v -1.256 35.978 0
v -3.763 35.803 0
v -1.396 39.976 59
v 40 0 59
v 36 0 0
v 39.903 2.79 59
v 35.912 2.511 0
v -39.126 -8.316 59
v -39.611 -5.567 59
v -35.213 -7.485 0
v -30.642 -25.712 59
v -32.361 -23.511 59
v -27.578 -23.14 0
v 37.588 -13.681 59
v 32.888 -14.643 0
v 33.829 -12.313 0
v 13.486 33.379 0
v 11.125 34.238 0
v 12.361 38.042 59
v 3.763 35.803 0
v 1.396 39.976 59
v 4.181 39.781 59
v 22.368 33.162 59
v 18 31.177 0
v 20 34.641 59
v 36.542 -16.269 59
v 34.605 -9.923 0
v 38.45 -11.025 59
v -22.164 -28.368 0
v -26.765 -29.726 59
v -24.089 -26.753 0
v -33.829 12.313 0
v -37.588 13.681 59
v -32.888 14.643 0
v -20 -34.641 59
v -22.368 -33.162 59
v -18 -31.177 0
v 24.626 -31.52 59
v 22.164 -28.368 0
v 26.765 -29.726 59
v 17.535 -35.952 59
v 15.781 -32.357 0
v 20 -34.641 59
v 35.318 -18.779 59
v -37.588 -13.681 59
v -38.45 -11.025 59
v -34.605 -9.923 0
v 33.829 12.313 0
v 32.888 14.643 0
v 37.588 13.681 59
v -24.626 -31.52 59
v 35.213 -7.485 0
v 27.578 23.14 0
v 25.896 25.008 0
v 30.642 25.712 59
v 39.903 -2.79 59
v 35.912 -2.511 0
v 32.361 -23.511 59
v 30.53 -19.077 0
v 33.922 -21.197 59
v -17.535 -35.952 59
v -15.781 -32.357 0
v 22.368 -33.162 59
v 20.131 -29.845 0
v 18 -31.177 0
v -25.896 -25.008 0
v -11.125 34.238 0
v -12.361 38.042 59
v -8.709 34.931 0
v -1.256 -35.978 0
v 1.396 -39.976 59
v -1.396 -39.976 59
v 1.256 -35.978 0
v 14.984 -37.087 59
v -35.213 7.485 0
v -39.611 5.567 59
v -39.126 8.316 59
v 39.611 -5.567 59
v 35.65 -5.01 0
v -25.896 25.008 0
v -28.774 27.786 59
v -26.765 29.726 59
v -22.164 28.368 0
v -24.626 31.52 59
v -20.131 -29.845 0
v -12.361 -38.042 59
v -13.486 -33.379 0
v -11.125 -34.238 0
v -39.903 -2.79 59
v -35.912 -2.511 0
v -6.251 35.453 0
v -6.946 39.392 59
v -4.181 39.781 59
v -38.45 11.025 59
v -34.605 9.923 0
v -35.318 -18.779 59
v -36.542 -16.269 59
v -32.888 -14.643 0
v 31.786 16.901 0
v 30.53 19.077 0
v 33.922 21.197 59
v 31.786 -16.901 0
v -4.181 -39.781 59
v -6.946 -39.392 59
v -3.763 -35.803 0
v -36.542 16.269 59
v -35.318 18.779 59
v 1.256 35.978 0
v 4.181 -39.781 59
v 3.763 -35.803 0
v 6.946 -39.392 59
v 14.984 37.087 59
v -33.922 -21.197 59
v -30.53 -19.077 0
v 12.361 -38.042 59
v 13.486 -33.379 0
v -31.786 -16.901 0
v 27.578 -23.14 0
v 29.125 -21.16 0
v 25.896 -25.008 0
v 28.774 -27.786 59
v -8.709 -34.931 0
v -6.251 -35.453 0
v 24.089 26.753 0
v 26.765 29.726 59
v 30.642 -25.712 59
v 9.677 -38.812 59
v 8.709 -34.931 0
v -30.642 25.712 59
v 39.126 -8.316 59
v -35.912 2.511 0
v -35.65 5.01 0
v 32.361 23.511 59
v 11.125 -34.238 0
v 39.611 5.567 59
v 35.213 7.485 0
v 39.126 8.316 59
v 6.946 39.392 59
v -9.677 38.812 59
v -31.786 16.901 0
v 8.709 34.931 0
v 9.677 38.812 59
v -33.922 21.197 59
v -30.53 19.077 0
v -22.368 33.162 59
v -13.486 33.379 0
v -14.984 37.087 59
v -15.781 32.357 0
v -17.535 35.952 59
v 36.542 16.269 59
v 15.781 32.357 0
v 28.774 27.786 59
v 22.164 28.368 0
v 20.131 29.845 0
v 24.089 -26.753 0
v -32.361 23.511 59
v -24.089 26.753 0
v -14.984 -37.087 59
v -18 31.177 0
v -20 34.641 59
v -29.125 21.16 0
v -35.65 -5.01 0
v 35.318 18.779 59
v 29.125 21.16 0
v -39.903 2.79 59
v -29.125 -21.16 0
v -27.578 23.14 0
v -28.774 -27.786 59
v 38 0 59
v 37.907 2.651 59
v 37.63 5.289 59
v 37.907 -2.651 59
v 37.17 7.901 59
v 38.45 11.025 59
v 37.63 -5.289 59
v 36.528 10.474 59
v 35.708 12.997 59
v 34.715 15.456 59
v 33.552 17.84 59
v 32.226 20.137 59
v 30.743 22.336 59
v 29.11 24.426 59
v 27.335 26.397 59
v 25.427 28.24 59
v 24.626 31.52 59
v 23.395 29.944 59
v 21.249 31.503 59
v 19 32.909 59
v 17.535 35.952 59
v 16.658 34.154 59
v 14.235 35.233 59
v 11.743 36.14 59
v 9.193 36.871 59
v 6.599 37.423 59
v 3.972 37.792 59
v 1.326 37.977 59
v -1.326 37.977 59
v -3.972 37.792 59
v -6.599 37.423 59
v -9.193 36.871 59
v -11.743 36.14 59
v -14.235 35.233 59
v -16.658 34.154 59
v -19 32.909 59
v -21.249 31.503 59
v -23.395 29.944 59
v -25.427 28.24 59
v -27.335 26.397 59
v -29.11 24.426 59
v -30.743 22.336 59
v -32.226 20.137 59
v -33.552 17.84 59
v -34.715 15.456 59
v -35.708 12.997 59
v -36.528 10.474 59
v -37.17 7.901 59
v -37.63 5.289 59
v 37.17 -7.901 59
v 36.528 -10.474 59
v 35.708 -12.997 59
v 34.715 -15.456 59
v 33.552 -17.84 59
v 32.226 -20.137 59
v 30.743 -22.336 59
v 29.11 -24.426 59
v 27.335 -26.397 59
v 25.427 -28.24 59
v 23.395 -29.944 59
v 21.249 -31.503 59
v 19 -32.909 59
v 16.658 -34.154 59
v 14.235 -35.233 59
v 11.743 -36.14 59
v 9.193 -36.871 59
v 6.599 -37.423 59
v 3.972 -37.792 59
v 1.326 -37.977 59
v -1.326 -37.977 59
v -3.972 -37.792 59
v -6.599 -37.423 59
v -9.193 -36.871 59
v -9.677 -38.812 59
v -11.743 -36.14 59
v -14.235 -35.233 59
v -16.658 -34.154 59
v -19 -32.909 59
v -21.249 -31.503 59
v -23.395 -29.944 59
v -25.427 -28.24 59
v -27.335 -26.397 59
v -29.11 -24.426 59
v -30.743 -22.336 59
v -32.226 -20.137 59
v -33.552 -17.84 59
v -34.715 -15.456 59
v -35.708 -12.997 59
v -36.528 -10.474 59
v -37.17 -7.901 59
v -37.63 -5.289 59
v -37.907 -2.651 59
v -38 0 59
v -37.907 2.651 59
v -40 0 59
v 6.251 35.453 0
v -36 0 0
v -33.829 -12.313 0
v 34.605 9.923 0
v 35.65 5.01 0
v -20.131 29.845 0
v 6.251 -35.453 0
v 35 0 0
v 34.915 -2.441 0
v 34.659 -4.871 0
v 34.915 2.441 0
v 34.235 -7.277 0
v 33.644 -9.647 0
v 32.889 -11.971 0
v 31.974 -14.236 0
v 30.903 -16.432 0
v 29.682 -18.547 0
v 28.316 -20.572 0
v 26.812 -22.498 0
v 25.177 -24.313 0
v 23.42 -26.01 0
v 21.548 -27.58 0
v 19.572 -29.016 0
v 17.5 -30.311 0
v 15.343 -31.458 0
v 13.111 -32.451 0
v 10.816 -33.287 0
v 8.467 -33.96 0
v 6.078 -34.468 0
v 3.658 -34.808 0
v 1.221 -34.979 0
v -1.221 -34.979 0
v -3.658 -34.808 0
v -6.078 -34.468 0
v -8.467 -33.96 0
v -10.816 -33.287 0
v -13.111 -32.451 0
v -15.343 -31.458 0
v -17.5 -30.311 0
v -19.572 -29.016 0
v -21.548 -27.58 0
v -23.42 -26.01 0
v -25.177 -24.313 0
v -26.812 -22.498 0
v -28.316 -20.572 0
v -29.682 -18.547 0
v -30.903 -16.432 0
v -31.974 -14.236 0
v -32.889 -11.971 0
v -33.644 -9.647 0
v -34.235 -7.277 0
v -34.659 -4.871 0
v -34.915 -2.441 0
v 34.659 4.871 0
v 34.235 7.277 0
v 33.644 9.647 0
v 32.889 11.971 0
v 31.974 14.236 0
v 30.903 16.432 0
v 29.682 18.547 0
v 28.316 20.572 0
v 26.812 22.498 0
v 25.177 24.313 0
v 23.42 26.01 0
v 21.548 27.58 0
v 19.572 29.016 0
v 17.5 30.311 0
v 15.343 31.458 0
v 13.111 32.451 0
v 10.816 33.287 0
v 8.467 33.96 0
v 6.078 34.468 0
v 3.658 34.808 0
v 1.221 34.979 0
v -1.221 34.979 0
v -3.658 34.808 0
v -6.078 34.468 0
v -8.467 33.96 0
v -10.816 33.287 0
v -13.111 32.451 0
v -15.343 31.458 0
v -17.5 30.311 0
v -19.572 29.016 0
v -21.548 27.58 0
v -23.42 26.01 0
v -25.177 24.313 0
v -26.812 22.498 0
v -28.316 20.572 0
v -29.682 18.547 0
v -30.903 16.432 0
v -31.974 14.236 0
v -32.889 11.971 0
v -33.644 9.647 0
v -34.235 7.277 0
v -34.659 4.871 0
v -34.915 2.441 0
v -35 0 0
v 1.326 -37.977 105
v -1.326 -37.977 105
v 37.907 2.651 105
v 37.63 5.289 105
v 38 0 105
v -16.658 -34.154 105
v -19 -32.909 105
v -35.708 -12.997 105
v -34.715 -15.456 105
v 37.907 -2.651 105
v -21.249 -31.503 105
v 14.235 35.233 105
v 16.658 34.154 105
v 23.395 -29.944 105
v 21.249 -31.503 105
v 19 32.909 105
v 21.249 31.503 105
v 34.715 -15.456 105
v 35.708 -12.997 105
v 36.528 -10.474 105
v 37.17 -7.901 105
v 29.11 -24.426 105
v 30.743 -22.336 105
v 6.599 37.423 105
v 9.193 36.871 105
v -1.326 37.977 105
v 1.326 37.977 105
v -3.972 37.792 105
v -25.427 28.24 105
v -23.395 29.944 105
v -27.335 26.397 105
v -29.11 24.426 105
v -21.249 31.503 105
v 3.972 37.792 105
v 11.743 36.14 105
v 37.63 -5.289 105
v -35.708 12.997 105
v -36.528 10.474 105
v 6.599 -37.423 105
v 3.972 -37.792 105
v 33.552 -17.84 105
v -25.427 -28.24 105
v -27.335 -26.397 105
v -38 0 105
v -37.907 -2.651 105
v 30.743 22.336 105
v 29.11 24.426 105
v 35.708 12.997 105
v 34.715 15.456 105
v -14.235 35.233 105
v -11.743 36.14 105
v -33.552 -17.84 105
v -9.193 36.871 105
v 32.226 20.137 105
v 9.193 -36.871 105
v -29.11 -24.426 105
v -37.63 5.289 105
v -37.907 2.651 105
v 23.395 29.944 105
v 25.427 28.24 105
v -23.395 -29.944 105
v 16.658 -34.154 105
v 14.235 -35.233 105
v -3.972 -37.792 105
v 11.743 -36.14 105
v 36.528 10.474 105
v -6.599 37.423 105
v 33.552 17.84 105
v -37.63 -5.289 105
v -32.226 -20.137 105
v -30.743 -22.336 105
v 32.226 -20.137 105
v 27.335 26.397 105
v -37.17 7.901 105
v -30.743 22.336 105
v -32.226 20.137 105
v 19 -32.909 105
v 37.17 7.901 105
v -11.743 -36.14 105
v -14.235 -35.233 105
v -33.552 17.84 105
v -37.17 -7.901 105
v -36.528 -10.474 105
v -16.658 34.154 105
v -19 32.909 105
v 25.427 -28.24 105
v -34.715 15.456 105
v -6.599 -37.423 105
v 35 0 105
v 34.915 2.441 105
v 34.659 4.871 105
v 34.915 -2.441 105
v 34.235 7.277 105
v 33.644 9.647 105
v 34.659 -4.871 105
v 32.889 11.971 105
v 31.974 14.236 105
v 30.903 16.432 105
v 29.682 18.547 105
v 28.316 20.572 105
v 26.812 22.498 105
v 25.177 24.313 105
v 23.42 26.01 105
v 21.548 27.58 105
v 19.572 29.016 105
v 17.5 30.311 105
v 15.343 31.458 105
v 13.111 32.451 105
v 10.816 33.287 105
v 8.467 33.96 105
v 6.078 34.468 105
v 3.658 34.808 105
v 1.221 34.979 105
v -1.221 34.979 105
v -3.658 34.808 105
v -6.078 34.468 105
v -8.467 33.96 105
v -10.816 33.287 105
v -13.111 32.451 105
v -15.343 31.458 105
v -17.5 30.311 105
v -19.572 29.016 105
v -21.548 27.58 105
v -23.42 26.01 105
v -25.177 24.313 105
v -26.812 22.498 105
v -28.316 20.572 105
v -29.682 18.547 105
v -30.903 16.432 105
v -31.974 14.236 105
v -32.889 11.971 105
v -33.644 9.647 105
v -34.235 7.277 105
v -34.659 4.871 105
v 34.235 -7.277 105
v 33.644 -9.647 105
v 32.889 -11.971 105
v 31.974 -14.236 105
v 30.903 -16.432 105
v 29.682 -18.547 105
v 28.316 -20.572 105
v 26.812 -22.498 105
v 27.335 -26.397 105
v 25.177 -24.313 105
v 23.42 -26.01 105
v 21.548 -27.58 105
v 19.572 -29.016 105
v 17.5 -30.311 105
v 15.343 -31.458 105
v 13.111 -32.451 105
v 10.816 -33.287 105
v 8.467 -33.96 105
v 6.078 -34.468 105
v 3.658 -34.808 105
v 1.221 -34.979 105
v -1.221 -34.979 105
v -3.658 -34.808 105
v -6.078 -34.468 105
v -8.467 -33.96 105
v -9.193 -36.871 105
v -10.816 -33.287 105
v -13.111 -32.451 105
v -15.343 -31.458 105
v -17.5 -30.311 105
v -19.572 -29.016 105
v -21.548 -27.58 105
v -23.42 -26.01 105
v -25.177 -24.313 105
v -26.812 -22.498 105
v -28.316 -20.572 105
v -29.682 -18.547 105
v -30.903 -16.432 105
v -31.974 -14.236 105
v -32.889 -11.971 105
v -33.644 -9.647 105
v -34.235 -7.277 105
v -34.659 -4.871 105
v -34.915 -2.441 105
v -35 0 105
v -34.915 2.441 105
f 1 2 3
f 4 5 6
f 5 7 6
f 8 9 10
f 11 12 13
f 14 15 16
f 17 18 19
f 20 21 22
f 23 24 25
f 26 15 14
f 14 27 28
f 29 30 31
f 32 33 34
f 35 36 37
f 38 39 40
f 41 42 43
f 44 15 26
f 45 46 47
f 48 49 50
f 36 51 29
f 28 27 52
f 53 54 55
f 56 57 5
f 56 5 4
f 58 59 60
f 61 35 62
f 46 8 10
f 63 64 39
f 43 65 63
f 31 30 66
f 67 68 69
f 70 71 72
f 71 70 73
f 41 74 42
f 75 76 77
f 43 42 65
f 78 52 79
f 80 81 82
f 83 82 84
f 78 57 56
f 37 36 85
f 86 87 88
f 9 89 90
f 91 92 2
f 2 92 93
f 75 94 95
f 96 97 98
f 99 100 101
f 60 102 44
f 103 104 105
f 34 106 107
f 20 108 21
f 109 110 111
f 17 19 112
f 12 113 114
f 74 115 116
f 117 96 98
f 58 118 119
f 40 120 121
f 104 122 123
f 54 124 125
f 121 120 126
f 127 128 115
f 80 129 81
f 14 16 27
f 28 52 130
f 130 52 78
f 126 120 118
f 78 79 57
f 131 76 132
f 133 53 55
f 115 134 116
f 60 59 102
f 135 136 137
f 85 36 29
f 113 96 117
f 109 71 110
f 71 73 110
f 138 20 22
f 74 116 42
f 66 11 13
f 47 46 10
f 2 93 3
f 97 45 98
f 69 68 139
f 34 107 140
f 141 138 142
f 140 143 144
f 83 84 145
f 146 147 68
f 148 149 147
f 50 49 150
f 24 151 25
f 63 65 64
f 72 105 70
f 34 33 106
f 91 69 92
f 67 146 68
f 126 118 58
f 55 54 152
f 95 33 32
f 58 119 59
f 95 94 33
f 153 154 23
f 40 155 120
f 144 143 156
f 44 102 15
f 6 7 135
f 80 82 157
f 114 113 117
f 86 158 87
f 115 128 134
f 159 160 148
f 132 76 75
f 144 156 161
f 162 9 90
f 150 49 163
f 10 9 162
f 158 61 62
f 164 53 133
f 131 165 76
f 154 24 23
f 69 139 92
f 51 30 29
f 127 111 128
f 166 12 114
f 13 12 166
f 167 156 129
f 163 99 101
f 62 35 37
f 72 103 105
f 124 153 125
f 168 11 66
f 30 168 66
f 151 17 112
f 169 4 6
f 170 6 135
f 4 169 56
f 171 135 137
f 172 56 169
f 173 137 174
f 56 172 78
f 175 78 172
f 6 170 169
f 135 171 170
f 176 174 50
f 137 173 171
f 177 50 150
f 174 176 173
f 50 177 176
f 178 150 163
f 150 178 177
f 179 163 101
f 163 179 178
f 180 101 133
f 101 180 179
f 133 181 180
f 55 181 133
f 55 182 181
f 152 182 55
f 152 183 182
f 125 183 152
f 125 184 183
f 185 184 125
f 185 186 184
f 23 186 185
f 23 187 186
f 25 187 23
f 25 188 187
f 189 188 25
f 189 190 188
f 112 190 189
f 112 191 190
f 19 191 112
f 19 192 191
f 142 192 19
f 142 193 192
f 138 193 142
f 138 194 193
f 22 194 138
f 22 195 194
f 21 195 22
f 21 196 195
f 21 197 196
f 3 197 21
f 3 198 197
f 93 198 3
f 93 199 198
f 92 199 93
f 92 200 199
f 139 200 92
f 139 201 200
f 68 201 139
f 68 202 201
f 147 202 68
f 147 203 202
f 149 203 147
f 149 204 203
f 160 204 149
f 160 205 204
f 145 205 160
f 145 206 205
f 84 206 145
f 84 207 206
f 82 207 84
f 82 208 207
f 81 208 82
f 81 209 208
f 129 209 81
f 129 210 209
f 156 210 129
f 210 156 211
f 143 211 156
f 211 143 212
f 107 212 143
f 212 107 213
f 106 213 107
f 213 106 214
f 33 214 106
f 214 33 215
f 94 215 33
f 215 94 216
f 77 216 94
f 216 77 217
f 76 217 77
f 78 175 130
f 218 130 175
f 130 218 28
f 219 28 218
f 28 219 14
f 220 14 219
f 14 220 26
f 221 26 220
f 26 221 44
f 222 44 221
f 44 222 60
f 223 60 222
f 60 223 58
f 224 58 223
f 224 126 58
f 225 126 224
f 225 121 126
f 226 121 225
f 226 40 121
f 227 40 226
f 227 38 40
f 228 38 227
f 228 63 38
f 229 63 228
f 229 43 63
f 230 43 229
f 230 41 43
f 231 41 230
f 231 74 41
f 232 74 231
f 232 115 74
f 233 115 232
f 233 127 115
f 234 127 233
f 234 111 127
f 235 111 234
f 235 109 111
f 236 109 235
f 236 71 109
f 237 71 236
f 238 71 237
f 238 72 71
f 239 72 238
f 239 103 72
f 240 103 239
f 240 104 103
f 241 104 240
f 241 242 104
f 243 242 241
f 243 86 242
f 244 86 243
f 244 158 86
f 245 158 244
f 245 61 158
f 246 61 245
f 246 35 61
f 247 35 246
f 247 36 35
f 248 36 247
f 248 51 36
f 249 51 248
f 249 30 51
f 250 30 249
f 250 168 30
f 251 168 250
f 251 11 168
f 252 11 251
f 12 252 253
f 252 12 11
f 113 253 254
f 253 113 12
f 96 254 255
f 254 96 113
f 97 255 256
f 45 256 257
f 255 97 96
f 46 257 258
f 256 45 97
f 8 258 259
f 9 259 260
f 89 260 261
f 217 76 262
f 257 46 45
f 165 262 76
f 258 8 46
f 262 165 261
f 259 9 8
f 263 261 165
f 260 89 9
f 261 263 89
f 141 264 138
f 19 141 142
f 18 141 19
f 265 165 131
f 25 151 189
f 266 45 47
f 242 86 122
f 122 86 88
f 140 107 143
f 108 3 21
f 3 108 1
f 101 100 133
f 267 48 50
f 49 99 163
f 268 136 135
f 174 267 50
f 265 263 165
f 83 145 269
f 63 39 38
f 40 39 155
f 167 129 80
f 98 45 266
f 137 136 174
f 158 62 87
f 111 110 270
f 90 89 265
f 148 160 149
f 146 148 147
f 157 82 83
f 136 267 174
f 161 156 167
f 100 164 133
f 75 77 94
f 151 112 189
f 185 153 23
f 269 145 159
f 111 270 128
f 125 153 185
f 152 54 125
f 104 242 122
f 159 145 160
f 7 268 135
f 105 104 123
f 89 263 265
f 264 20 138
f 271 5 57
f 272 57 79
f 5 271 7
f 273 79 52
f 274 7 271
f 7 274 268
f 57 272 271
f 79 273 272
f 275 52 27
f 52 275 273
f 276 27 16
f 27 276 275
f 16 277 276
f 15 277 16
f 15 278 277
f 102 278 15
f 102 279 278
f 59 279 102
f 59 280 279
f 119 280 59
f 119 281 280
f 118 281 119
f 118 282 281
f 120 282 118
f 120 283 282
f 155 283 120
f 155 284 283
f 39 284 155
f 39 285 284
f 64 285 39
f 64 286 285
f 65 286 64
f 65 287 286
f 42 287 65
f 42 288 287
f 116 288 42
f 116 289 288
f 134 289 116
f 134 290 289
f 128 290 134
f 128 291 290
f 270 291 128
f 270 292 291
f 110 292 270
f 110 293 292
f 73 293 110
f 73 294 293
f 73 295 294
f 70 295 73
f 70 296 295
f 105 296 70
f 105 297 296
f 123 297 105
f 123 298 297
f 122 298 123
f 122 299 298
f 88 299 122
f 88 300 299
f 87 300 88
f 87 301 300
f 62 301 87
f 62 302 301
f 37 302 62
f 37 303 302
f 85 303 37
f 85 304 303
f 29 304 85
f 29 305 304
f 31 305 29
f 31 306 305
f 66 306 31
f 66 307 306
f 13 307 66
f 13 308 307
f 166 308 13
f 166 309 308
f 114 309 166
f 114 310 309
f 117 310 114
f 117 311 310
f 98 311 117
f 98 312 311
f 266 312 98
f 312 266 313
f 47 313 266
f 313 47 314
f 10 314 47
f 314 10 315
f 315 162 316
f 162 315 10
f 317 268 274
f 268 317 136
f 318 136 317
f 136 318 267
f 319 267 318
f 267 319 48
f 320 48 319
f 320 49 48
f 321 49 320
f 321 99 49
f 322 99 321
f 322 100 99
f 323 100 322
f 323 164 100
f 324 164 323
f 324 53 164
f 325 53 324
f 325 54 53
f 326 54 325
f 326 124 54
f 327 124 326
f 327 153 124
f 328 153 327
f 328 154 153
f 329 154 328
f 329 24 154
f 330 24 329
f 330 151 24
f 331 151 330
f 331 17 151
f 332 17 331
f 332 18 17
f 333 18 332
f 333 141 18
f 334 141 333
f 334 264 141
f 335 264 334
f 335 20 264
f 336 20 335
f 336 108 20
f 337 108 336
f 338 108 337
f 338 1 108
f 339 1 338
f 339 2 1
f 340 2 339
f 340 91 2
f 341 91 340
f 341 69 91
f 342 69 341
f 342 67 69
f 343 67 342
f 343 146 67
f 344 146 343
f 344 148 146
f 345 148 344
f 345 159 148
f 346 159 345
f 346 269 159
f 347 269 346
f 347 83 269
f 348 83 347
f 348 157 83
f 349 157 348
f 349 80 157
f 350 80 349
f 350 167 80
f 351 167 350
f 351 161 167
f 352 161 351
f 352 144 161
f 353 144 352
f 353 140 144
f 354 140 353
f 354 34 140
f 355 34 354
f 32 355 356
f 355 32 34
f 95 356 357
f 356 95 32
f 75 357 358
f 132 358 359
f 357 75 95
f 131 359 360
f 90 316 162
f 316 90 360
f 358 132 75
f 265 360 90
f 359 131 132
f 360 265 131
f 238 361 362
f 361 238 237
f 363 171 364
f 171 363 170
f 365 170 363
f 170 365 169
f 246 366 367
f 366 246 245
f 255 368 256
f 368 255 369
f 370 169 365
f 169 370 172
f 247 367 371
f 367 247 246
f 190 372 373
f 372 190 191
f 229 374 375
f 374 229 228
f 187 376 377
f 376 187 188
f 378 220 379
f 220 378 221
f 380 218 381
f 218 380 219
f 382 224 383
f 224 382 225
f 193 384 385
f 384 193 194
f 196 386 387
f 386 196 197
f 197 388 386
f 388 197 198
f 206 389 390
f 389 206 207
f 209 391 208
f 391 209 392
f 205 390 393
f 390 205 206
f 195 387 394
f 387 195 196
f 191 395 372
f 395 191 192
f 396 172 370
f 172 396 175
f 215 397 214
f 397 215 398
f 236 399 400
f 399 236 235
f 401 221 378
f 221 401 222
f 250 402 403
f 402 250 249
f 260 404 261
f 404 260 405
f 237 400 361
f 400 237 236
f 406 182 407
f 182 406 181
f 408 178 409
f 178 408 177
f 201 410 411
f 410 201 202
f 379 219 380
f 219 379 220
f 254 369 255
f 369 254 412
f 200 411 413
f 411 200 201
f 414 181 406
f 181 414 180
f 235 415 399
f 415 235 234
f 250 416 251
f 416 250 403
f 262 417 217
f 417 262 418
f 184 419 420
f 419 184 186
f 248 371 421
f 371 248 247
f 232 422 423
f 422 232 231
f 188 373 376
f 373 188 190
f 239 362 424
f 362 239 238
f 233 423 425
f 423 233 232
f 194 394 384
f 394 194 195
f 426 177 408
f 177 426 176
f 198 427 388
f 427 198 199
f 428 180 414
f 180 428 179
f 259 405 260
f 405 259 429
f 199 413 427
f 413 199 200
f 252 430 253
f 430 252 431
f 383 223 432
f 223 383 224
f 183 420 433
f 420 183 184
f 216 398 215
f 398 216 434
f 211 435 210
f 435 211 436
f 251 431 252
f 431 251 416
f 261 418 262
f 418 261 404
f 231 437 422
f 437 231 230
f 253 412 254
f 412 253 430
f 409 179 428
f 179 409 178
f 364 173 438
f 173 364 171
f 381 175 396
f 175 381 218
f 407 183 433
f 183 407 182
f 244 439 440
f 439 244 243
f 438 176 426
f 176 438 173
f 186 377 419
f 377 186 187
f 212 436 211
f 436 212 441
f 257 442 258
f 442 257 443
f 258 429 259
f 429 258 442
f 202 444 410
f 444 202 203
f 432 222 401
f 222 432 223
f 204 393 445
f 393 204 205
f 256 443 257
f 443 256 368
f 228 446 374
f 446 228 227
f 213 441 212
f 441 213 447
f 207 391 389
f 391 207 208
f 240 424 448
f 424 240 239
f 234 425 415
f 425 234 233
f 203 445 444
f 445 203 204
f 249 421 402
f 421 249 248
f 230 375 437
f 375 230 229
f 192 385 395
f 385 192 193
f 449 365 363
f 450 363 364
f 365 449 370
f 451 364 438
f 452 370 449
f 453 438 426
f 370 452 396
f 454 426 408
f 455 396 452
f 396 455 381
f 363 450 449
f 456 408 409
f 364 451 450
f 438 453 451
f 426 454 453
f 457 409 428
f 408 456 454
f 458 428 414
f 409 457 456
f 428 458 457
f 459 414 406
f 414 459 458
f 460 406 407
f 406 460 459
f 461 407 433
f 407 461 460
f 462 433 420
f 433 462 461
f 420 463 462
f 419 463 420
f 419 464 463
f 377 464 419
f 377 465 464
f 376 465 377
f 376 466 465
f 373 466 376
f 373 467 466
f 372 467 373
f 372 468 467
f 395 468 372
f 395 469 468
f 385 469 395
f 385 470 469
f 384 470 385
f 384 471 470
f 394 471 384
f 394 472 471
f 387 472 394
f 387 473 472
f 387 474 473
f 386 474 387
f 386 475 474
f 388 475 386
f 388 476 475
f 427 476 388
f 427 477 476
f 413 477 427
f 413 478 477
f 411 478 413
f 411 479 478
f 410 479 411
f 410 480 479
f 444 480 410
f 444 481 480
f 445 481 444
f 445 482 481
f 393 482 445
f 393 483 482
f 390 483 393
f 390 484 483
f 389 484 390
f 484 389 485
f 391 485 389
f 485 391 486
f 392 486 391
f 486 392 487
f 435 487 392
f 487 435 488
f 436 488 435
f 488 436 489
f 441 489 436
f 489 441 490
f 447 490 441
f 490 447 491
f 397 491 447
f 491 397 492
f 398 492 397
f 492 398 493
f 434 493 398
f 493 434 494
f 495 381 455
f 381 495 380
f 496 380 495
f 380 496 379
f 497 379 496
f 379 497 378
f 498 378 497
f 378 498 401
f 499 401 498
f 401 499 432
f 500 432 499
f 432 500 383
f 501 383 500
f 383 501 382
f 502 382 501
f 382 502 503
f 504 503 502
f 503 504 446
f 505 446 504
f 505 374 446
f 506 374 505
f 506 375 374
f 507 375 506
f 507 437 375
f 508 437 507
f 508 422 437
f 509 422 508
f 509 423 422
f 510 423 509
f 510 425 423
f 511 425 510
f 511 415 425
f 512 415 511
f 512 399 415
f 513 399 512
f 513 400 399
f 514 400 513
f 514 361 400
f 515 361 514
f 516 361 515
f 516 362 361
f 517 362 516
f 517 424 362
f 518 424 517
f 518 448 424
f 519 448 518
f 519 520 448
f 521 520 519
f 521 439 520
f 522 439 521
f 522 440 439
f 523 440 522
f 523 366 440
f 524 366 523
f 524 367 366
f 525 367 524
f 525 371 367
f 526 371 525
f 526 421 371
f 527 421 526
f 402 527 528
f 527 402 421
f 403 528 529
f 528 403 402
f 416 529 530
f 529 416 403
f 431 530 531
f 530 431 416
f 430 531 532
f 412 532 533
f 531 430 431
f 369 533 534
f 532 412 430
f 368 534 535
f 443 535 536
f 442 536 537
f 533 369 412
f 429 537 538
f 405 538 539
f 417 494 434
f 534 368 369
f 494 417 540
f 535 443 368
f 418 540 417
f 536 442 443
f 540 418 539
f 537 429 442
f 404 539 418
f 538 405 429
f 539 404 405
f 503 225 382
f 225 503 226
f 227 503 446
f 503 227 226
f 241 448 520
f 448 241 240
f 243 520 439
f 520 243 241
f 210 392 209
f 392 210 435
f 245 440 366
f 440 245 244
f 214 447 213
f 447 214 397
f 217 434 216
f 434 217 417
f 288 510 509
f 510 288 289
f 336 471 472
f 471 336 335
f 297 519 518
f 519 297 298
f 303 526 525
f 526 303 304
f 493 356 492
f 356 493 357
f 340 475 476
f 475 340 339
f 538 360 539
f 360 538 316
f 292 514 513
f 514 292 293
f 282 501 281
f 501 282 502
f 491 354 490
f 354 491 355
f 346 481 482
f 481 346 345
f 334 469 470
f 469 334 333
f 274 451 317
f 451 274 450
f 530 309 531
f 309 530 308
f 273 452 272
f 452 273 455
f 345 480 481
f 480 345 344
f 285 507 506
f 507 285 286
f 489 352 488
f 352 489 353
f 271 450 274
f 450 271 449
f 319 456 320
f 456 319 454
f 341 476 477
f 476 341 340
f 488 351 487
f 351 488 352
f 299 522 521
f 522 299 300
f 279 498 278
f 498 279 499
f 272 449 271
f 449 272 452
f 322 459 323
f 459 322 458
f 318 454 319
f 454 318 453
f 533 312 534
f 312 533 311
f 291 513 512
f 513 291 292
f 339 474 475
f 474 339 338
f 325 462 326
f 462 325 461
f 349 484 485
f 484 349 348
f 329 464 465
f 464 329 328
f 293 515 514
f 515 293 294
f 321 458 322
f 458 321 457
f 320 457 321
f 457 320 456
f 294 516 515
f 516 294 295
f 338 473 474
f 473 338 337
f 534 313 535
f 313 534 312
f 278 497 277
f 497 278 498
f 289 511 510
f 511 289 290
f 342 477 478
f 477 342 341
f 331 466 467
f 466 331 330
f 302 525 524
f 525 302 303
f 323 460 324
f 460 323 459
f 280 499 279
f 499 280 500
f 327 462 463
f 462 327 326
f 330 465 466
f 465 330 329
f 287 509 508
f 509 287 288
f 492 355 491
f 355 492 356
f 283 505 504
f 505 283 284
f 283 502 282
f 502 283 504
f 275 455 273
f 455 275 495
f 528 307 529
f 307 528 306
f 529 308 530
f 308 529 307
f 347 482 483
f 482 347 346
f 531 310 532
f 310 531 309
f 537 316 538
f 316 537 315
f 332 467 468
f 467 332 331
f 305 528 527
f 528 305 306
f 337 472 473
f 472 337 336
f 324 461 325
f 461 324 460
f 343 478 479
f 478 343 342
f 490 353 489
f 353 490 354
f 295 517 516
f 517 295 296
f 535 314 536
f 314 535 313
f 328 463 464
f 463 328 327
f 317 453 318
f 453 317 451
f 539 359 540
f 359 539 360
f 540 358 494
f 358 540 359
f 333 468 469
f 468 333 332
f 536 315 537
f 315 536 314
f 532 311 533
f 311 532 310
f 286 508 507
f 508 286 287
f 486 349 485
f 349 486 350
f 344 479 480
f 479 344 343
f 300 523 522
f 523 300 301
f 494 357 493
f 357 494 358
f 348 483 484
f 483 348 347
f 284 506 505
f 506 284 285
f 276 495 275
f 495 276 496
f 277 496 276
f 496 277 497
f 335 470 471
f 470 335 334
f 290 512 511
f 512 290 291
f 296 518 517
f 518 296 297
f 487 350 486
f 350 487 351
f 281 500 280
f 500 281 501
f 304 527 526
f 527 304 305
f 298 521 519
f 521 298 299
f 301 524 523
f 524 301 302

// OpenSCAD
PlugHeight    = 59; // height of plug
FloorDiameter = 72; // bottom diameter
TopDiameter   = 80; // top diameter

HolderHeight = 105; // height of holder
HolderID     = 70; // inner diameter of holder
HolderWall   = 3; 

$fn = 90;

top = HolderHeight - PlugHeight;

difference(){
    union() {
        cylinder( // primary plug
            h = PlugHeight, // height of plug
            d1 = FloorDiameter, // bottom diameter
            d2 = TopDiameter); // top diameter
        translate([0,0, PlugHeight]) cylinder(
            h = HolderHeight - PlugHeight,
            d = HolderID + 2*HolderWall);
 



        }
    translate([0,0,0]) cylinder( 
        h = HolderHeight,
        d = HolderID);
    }    
